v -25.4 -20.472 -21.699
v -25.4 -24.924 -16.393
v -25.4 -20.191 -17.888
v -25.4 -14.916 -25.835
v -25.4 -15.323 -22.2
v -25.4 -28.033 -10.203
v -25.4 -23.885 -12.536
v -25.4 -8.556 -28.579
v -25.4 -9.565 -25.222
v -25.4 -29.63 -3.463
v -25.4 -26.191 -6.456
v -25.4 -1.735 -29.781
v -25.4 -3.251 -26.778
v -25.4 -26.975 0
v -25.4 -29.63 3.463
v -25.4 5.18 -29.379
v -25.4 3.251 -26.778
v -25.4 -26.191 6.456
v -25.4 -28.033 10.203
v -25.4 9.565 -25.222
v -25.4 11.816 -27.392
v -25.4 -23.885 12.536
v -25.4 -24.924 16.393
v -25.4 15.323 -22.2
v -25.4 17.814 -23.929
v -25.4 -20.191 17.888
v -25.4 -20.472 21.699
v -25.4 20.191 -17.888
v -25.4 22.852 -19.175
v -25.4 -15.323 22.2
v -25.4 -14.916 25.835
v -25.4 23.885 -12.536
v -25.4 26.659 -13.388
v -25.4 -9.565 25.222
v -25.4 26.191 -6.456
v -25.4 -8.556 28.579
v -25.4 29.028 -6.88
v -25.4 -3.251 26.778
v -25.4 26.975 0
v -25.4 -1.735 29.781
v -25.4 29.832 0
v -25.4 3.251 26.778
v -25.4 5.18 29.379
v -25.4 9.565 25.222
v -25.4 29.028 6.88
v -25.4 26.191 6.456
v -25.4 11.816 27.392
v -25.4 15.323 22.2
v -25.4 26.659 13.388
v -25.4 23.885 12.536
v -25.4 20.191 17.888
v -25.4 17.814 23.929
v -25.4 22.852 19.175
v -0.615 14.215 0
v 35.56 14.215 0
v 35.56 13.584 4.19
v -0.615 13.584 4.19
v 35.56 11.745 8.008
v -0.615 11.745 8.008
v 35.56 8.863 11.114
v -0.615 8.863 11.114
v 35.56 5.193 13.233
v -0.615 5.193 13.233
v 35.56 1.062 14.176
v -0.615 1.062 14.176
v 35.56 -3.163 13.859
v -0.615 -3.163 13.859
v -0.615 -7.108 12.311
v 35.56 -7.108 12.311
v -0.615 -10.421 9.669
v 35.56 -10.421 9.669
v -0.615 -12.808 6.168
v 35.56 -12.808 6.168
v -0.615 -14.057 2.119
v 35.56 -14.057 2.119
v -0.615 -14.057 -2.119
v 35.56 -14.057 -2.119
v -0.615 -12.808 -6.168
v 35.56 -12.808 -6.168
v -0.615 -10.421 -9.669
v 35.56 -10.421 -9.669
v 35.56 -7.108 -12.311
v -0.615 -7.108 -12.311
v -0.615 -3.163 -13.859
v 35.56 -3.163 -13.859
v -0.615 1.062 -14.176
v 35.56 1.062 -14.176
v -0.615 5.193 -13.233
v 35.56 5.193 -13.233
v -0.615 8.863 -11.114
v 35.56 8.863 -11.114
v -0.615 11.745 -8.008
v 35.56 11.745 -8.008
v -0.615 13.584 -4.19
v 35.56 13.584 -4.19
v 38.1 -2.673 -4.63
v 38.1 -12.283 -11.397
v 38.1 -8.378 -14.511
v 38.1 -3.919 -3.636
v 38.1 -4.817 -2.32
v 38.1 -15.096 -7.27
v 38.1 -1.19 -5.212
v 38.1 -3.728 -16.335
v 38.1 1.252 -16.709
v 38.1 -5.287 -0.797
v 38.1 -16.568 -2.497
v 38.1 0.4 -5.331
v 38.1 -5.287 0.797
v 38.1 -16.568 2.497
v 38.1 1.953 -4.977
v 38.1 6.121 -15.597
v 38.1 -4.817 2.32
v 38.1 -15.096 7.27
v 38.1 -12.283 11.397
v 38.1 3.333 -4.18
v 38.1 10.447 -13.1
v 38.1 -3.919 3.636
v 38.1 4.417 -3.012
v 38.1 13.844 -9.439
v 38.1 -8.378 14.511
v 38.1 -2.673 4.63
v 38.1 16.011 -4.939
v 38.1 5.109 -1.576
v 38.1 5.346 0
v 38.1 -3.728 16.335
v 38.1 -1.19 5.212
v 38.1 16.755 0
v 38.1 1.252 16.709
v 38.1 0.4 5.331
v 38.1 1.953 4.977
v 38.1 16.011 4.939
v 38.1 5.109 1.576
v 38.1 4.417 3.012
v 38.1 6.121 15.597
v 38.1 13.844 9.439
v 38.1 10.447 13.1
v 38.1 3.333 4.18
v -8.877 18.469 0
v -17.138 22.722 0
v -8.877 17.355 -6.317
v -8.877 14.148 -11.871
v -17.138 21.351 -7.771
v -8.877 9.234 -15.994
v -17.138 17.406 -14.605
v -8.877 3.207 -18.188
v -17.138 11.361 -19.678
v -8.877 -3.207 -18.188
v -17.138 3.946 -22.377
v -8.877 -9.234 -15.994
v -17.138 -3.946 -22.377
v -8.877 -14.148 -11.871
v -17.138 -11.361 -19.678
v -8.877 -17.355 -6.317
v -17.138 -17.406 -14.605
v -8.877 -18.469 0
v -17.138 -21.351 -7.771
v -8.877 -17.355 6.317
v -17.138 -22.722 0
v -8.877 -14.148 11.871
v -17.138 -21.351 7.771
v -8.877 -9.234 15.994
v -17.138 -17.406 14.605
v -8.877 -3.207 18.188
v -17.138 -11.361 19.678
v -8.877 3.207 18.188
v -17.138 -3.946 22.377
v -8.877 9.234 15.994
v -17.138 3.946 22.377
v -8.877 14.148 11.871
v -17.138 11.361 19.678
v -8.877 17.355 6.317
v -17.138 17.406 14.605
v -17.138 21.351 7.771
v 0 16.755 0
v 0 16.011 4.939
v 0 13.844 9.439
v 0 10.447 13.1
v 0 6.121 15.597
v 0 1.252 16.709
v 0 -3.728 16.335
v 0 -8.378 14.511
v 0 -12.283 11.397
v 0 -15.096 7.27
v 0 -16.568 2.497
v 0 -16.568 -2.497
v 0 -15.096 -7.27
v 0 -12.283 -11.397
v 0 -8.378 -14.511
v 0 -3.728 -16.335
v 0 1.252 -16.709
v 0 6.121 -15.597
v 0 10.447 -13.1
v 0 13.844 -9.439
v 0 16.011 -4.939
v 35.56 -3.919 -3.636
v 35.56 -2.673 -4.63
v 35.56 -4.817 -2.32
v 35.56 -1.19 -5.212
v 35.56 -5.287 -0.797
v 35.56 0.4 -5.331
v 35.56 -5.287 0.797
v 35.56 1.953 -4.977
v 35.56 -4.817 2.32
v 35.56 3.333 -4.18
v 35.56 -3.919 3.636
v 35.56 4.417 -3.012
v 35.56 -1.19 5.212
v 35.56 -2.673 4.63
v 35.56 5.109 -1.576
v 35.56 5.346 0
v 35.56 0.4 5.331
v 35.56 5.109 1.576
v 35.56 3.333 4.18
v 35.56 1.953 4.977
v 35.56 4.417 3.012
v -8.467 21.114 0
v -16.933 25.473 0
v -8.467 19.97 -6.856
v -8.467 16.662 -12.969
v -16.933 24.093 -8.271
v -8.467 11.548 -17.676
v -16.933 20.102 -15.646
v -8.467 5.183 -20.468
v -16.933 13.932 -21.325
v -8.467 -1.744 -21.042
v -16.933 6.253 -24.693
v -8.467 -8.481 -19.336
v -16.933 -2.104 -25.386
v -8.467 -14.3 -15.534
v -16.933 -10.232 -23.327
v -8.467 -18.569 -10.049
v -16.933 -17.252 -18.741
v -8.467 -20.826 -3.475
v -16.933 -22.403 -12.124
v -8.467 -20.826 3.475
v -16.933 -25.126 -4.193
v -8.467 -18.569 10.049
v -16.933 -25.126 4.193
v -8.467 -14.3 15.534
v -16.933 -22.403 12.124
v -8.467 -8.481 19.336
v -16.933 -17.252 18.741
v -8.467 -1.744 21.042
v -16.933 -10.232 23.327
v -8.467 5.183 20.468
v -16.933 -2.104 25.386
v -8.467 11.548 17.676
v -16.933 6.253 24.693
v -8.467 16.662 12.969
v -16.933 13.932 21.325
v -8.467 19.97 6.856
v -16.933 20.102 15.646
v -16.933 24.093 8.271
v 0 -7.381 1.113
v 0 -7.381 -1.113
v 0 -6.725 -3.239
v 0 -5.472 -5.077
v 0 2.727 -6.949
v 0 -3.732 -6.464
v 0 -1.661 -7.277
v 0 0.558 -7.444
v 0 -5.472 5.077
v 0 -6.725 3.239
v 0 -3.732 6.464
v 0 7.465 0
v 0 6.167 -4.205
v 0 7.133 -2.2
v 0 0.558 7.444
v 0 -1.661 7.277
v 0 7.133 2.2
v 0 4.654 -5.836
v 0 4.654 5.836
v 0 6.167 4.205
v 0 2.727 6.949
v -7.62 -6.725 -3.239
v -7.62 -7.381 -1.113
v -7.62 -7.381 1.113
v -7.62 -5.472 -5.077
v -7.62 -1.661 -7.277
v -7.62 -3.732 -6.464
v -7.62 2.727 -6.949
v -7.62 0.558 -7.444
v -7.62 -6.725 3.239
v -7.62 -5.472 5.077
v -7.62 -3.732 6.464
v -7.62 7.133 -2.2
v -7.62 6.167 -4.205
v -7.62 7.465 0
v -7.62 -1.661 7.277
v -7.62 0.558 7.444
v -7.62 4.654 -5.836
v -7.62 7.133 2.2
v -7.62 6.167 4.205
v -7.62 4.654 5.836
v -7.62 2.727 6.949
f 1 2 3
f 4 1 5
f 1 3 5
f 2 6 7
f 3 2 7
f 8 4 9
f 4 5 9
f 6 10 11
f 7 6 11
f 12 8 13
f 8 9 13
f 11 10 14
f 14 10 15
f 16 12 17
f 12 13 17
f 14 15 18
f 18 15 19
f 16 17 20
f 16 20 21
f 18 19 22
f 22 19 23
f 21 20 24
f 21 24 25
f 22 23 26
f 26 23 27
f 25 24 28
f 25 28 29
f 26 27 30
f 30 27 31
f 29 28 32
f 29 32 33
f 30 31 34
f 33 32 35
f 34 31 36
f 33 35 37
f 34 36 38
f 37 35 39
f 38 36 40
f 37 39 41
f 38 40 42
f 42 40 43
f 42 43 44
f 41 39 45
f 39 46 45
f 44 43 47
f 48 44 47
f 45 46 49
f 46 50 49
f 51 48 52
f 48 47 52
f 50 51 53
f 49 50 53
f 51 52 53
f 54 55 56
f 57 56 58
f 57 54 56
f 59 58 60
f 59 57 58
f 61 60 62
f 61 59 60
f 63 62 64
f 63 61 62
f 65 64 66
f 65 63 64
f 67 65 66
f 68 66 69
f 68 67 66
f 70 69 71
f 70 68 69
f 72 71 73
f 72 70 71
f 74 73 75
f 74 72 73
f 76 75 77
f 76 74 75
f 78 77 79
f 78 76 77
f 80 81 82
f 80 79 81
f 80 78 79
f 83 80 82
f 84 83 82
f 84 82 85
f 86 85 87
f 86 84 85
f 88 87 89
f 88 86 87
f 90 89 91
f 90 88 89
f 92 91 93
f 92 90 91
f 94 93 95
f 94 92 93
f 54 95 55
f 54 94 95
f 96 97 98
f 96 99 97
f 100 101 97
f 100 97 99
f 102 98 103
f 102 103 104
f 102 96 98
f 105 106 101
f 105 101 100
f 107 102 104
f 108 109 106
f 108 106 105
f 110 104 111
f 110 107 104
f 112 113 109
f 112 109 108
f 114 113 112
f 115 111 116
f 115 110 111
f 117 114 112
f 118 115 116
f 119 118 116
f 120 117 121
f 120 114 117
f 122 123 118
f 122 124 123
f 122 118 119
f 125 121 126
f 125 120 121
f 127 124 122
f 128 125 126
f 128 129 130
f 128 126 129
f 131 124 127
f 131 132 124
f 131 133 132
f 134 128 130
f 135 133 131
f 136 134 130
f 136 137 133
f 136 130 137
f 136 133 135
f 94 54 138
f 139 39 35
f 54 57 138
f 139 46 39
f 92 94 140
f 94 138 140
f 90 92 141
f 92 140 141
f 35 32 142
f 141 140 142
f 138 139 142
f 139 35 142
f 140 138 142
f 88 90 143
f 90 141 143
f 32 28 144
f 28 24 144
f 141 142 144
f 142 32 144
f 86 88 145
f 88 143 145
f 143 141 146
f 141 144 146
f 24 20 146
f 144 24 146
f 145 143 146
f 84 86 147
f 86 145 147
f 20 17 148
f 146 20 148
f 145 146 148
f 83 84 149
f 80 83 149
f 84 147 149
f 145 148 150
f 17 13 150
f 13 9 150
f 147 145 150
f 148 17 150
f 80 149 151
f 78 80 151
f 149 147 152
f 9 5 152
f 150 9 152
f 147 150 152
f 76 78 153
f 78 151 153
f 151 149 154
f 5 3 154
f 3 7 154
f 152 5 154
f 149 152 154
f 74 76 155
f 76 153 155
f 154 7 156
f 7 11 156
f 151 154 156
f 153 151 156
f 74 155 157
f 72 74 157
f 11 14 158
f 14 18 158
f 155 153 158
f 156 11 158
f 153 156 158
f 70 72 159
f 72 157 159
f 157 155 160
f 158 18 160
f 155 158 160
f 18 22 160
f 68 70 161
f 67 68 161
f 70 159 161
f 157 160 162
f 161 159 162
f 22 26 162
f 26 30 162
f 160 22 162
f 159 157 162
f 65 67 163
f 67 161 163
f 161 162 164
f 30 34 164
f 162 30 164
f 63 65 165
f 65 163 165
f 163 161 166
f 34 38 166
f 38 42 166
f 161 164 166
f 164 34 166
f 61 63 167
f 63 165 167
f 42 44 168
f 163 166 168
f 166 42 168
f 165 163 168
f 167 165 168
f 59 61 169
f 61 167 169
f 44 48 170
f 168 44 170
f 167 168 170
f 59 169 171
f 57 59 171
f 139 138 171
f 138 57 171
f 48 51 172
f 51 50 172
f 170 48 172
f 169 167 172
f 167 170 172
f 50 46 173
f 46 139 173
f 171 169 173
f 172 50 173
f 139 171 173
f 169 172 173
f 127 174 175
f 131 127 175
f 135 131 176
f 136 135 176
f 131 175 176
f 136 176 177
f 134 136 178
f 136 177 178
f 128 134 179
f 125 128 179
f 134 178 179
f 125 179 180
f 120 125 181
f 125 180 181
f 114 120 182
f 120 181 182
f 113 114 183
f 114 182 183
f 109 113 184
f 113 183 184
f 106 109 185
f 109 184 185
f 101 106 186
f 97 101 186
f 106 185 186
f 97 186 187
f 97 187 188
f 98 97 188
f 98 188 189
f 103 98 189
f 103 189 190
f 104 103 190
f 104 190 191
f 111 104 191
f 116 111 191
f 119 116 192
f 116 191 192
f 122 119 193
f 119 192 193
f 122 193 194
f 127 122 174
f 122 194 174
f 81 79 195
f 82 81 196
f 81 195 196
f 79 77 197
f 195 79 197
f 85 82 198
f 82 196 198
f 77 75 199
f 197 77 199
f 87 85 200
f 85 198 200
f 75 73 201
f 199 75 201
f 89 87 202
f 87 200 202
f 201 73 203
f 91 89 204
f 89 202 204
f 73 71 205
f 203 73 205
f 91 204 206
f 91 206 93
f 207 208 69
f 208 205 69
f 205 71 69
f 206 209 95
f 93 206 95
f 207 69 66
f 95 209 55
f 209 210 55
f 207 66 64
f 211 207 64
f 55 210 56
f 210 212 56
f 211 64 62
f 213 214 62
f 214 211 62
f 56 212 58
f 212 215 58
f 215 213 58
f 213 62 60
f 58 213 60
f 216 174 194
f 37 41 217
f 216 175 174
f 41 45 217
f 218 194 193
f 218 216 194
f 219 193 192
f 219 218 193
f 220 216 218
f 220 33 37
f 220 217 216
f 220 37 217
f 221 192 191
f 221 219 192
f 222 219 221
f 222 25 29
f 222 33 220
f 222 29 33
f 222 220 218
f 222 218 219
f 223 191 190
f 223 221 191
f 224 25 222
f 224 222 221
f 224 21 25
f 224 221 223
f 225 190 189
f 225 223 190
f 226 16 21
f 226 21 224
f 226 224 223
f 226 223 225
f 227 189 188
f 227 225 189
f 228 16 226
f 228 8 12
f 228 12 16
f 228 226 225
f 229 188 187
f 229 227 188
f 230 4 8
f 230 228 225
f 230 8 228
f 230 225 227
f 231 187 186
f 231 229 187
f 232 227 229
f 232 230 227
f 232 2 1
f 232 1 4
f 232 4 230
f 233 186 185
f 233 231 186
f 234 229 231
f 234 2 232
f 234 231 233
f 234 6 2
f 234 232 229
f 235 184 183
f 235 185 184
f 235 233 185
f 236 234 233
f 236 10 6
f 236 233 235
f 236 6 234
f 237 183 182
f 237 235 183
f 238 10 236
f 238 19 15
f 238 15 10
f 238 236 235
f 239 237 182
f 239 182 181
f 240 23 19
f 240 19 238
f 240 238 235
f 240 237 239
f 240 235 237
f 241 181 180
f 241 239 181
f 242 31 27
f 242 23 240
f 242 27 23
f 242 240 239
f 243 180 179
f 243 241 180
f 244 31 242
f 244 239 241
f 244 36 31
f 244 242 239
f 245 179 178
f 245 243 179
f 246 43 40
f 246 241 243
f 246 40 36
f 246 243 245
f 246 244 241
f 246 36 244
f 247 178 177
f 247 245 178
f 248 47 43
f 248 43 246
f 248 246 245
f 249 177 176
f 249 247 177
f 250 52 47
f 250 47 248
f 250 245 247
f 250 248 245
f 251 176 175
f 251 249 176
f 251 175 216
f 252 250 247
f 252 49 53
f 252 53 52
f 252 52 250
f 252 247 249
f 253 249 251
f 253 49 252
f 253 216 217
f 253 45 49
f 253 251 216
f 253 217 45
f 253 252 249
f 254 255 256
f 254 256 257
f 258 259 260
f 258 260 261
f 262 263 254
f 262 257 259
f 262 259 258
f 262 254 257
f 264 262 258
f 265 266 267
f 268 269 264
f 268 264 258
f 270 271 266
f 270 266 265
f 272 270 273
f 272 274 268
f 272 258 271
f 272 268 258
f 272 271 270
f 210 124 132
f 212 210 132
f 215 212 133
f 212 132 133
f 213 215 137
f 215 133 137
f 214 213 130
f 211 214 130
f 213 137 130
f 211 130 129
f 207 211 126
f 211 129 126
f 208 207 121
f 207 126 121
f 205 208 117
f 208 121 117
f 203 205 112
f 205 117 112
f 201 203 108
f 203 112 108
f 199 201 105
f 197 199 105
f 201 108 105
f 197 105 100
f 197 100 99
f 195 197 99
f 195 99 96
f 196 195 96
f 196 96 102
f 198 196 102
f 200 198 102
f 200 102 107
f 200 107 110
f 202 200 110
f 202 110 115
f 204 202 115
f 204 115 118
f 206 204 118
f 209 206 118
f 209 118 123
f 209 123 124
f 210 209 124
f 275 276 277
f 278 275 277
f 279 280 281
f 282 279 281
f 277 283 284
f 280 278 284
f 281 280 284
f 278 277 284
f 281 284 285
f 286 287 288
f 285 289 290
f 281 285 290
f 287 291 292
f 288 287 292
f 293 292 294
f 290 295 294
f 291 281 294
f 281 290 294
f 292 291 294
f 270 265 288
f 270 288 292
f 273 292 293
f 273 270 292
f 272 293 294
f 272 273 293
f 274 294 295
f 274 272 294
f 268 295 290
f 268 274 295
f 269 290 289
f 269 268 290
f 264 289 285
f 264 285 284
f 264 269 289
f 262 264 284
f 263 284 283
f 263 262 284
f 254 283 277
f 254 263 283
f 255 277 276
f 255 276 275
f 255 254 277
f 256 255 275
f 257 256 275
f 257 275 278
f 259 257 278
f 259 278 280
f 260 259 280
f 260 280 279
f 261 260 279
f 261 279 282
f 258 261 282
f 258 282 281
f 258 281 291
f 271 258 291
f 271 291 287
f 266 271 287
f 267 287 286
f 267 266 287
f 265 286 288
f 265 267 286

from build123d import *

# Parameters (mm, degrees)
F0_R      = 16.755355229
F1_DEPTH  = 38.1
F1_FACE_R = 16.755355229
F3_R      = 29.8317515967
F5_T      = -2.54
F6_R      = 5.3463872414
F7_DEPTH  = 25.4
F8_R      = 7.4645289375
F9_DEPTH  = 7.62


with BuildPart() as f1:
    # F0 (on Right) → F1 (new body)
    with BuildSketch(Plane.YZ):
        Circle(F0_R)
    extrude(amount=F1_DEPTH)

    # F1_face (on face) → F4 section 0
    with BuildSketch(Plane(origin=(0, 0, 0), x_dir=(0, 1, 0), z_dir=(-1, 0, 0))):
        Circle(F1_FACE_R)
    # F3 (on offset) → F4 section 1
    with BuildSketch(Plane.YZ.offset(-25.4)):
        Circle(F3_R)
    loft()

    # F5
    f5_openings = [f1.faces().sort_by_distance(p)[0] for p in [
        (-25.4, 0, 0),
    ]]
    offset(amount=F5_T, openings=f5_openings, kind=Kind.INTERSECTION)

    # F6 (on face) → F7 (cut)
    with BuildSketch(Plane.YZ.offset(38.1)):
        Circle(F6_R)
    extrude(amount=-F7_DEPTH, mode=Mode.SUBTRACT)


with BuildPart() as f9:
    # F8 (on Right) → F9 (new body)
    with BuildSketch(Plane.YZ):
        Circle(F8_R)
    extrude(amount=-F9_DEPTH)


solid = Compound([f1.part, f9.part])
